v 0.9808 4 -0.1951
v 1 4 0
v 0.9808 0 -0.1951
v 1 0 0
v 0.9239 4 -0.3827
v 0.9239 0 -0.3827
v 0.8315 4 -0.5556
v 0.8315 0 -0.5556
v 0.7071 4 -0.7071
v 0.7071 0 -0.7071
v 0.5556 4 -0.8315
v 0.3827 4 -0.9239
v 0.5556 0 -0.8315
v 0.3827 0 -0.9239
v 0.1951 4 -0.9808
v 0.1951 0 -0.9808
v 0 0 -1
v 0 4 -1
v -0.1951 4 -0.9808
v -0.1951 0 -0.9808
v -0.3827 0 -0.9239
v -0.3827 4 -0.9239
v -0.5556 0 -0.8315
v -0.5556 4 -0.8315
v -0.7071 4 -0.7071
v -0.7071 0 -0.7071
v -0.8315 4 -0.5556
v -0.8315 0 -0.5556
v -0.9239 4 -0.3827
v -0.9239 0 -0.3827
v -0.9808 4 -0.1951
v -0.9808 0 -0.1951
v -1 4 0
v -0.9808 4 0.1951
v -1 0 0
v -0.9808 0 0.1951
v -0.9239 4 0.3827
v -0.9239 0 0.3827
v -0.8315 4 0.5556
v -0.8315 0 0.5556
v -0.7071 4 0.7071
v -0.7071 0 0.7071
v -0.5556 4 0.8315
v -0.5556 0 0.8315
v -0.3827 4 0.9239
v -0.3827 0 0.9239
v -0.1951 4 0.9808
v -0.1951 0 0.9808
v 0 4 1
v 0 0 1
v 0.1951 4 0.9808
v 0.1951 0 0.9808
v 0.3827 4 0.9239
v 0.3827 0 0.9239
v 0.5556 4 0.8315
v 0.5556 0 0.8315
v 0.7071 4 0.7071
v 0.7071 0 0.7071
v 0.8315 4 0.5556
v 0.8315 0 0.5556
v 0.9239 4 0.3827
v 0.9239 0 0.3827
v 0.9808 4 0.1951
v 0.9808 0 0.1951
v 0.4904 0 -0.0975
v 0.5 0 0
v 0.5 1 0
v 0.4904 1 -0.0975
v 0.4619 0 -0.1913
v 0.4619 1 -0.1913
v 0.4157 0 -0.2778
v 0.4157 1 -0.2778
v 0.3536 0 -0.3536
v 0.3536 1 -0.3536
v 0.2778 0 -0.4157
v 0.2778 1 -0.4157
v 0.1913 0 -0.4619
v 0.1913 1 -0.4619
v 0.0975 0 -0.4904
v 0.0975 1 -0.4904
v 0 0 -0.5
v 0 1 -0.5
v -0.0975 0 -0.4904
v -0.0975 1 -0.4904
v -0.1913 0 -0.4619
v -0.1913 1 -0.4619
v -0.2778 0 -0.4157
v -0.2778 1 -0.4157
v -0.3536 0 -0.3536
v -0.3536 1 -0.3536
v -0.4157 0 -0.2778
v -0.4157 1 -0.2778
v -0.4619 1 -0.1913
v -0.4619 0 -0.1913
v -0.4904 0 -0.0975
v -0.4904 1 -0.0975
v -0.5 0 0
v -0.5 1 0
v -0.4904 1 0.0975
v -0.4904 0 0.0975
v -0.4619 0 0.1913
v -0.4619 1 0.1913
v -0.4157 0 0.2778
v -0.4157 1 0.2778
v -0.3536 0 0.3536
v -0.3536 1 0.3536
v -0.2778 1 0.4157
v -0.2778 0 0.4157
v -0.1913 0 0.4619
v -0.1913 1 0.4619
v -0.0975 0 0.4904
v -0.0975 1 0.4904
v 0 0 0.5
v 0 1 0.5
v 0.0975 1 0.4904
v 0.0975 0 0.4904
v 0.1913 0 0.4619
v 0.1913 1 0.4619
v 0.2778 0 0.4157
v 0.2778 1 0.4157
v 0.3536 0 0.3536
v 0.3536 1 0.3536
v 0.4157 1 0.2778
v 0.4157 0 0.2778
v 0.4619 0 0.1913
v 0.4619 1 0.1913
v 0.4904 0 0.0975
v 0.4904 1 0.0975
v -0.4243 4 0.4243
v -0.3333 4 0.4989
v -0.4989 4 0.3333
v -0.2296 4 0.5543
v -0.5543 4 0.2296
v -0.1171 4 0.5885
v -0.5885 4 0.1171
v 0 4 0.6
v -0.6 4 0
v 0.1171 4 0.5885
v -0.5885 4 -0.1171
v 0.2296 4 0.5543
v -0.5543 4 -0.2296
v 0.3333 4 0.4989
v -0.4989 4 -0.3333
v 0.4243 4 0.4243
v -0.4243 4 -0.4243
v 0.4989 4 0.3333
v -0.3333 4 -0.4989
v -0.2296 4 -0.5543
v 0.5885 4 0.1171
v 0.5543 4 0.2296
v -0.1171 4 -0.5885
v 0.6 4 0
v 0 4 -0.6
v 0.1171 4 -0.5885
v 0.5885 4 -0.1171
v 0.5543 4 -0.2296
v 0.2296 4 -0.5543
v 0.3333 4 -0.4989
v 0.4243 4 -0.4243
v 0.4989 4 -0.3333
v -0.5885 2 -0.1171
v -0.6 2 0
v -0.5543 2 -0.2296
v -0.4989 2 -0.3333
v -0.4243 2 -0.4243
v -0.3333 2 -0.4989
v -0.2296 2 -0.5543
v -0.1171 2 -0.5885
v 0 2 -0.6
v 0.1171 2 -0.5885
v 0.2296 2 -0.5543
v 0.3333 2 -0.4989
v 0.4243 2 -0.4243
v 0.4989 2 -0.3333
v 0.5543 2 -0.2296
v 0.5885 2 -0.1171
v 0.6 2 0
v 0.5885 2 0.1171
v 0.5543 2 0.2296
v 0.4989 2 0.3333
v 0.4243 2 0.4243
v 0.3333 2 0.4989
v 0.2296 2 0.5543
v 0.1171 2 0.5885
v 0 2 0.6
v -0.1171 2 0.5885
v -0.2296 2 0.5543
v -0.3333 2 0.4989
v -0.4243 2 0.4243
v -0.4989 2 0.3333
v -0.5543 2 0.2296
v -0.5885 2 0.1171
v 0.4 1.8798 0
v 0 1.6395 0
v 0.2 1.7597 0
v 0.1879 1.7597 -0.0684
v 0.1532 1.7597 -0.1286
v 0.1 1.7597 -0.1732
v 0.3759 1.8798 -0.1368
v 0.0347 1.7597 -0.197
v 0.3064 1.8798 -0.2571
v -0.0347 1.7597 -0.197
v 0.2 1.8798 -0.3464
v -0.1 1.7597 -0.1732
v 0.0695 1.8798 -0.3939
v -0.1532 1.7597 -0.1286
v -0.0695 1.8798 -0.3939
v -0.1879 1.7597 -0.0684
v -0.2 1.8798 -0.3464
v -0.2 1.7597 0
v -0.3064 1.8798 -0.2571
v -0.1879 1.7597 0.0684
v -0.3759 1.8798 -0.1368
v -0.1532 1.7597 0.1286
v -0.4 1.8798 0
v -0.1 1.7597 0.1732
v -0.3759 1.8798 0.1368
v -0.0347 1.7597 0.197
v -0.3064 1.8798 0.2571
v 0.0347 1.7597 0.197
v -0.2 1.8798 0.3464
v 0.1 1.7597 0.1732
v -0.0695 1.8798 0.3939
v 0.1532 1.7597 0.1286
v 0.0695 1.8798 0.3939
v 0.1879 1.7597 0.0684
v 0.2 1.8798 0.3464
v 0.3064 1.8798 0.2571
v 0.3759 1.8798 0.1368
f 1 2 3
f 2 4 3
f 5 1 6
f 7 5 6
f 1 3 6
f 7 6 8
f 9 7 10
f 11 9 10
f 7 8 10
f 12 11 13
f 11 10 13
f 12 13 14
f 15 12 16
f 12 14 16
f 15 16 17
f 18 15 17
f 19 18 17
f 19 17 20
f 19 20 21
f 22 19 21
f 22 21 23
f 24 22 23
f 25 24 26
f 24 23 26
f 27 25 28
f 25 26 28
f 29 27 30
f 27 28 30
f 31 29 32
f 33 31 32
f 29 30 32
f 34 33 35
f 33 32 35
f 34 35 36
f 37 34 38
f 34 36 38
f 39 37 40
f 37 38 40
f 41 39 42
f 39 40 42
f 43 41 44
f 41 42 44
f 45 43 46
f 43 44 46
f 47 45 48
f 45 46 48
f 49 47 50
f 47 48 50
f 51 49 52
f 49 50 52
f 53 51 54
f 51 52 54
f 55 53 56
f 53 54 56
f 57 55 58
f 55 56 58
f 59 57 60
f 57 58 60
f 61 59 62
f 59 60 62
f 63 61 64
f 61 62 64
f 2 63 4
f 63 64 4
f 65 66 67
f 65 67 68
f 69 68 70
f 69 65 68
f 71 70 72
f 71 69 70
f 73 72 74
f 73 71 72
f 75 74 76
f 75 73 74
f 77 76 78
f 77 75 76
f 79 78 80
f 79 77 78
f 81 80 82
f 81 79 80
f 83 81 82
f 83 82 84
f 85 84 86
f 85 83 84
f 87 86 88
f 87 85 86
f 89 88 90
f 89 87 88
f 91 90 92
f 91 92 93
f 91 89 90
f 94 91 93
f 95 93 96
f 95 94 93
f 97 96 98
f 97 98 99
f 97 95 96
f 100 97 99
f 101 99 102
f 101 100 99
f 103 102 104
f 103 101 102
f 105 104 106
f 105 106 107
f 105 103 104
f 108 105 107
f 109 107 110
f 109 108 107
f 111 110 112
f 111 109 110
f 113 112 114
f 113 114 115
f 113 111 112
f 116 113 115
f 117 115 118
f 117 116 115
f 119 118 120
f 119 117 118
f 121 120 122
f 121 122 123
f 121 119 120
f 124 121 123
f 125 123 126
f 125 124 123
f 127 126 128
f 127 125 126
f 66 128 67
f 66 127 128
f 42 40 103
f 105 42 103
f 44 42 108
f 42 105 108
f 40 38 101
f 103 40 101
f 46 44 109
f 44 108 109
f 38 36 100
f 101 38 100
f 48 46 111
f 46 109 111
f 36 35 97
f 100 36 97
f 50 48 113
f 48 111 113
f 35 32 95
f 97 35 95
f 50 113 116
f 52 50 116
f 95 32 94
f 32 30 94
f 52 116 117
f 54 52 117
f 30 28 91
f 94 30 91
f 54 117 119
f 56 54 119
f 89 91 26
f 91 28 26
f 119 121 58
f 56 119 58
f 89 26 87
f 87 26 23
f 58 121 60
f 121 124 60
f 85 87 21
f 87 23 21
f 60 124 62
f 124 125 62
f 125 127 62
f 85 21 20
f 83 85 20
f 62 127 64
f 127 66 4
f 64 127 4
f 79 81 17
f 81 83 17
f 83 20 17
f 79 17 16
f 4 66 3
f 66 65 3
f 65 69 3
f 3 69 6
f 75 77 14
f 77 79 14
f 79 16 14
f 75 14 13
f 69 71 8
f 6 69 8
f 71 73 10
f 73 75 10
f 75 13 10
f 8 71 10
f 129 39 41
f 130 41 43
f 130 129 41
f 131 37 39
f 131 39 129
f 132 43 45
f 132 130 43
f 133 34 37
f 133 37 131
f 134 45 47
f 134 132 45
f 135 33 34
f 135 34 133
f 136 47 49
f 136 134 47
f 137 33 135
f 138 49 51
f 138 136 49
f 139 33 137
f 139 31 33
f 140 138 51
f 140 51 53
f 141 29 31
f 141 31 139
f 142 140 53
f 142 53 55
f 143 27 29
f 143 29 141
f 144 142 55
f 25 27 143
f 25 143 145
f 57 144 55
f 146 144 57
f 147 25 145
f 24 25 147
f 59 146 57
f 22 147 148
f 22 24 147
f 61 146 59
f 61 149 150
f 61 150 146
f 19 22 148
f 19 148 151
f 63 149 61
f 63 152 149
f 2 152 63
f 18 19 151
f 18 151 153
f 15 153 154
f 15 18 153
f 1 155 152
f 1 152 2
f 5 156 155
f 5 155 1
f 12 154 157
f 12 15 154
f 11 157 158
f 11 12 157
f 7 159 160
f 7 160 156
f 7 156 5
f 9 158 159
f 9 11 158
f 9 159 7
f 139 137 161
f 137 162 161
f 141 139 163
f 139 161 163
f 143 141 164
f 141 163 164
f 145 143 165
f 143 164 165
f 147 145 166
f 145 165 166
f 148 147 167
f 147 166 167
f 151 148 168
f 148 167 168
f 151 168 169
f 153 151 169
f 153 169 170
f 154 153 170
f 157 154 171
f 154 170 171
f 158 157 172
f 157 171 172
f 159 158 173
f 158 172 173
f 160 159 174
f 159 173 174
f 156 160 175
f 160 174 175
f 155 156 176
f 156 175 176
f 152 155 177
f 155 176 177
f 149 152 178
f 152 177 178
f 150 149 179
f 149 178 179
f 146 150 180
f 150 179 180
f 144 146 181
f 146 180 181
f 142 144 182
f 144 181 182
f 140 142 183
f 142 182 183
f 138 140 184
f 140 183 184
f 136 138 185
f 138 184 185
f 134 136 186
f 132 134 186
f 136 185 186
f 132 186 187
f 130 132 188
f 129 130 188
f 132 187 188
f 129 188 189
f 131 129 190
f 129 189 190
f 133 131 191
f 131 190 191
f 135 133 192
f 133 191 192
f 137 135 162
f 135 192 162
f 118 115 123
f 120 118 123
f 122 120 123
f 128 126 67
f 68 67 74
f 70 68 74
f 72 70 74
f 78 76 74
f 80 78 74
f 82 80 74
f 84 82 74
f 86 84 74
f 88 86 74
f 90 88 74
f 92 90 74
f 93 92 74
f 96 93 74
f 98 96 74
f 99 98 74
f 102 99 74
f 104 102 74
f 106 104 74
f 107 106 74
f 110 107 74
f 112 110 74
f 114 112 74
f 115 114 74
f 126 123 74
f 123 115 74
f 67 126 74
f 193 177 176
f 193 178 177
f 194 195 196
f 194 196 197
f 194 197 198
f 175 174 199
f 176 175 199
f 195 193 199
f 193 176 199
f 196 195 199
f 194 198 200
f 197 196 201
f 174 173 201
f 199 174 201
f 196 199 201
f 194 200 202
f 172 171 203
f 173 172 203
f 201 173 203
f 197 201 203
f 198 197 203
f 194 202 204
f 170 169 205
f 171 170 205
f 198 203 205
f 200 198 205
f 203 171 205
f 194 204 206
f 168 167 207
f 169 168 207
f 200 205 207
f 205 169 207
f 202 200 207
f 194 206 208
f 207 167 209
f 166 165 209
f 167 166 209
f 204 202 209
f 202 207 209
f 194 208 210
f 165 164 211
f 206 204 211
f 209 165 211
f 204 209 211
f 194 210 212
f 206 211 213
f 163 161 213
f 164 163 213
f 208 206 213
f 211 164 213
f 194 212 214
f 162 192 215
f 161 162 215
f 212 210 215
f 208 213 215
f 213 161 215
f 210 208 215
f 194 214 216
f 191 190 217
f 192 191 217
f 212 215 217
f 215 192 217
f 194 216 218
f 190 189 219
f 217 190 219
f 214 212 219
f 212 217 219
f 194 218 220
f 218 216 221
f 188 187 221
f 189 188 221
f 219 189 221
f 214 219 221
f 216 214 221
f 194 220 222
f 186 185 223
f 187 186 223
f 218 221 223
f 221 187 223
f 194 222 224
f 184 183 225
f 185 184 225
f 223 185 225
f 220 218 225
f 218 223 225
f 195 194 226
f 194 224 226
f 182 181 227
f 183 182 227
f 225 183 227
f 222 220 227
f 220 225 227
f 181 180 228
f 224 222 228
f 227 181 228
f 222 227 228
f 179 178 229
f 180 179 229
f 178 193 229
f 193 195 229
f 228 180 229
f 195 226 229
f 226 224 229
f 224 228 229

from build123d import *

# Parameters (mm, degrees)
SKETCH1_R                = 1
SKETCH1_R_2              = 0.5
BOSS_EXTRUDE1_DEPTH      = 1
SKETCH2_R                = 1
BOSS_EXTRUDE2_DEPTH      = 3
M1_CLEARANCE_HOLE1_D     = 1.2
M1_CLEARANCE_HOLE1_DEPTH = 2
M1_CLEARANCE_HOLE1_TIP   = 0.360516371


with BuildPart() as part:
    # Sketch1 → Boss-Extrude1 (new body)
    with BuildSketch(Plane(origin=(0, 0, 0), x_dir=(1, 0, 0), z_dir=(0, 1, 0))):
        Circle(SKETCH1_R)
        Circle(SKETCH1_R_2, mode=Mode.SUBTRACT)
    extrude(amount=BOSS_EXTRUDE1_DEPTH)

    # Sketch2 → Boss-Extrude2 (add)
    with BuildSketch(Plane(origin=(0, 1, 0), x_dir=(1, 0, 0), z_dir=(0, 1, 0))):
        Circle(SKETCH2_R)
    extrude(amount=BOSS_EXTRUDE2_DEPTH)

    # M1 Clearance Hole1
    with Locations(Plane(origin=(0, 4, 0), x_dir=(1, 0, 0), z_dir=(0, 1, 0))):
        with Locations((0, 0)):
            Hole(M1_CLEARANCE_HOLE1_D / 2, depth=M1_CLEARANCE_HOLE1_DEPTH)
            with Locations((0, 0, -(M1_CLEARANCE_HOLE1_DEPTH + M1_CLEARANCE_HOLE1_TIP / 2))):  # 118° drill point
                Cone(0, M1_CLEARANCE_HOLE1_D / 2, M1_CLEARANCE_HOLE1_TIP, mode=Mode.SUBTRACT)


solid = part.part
